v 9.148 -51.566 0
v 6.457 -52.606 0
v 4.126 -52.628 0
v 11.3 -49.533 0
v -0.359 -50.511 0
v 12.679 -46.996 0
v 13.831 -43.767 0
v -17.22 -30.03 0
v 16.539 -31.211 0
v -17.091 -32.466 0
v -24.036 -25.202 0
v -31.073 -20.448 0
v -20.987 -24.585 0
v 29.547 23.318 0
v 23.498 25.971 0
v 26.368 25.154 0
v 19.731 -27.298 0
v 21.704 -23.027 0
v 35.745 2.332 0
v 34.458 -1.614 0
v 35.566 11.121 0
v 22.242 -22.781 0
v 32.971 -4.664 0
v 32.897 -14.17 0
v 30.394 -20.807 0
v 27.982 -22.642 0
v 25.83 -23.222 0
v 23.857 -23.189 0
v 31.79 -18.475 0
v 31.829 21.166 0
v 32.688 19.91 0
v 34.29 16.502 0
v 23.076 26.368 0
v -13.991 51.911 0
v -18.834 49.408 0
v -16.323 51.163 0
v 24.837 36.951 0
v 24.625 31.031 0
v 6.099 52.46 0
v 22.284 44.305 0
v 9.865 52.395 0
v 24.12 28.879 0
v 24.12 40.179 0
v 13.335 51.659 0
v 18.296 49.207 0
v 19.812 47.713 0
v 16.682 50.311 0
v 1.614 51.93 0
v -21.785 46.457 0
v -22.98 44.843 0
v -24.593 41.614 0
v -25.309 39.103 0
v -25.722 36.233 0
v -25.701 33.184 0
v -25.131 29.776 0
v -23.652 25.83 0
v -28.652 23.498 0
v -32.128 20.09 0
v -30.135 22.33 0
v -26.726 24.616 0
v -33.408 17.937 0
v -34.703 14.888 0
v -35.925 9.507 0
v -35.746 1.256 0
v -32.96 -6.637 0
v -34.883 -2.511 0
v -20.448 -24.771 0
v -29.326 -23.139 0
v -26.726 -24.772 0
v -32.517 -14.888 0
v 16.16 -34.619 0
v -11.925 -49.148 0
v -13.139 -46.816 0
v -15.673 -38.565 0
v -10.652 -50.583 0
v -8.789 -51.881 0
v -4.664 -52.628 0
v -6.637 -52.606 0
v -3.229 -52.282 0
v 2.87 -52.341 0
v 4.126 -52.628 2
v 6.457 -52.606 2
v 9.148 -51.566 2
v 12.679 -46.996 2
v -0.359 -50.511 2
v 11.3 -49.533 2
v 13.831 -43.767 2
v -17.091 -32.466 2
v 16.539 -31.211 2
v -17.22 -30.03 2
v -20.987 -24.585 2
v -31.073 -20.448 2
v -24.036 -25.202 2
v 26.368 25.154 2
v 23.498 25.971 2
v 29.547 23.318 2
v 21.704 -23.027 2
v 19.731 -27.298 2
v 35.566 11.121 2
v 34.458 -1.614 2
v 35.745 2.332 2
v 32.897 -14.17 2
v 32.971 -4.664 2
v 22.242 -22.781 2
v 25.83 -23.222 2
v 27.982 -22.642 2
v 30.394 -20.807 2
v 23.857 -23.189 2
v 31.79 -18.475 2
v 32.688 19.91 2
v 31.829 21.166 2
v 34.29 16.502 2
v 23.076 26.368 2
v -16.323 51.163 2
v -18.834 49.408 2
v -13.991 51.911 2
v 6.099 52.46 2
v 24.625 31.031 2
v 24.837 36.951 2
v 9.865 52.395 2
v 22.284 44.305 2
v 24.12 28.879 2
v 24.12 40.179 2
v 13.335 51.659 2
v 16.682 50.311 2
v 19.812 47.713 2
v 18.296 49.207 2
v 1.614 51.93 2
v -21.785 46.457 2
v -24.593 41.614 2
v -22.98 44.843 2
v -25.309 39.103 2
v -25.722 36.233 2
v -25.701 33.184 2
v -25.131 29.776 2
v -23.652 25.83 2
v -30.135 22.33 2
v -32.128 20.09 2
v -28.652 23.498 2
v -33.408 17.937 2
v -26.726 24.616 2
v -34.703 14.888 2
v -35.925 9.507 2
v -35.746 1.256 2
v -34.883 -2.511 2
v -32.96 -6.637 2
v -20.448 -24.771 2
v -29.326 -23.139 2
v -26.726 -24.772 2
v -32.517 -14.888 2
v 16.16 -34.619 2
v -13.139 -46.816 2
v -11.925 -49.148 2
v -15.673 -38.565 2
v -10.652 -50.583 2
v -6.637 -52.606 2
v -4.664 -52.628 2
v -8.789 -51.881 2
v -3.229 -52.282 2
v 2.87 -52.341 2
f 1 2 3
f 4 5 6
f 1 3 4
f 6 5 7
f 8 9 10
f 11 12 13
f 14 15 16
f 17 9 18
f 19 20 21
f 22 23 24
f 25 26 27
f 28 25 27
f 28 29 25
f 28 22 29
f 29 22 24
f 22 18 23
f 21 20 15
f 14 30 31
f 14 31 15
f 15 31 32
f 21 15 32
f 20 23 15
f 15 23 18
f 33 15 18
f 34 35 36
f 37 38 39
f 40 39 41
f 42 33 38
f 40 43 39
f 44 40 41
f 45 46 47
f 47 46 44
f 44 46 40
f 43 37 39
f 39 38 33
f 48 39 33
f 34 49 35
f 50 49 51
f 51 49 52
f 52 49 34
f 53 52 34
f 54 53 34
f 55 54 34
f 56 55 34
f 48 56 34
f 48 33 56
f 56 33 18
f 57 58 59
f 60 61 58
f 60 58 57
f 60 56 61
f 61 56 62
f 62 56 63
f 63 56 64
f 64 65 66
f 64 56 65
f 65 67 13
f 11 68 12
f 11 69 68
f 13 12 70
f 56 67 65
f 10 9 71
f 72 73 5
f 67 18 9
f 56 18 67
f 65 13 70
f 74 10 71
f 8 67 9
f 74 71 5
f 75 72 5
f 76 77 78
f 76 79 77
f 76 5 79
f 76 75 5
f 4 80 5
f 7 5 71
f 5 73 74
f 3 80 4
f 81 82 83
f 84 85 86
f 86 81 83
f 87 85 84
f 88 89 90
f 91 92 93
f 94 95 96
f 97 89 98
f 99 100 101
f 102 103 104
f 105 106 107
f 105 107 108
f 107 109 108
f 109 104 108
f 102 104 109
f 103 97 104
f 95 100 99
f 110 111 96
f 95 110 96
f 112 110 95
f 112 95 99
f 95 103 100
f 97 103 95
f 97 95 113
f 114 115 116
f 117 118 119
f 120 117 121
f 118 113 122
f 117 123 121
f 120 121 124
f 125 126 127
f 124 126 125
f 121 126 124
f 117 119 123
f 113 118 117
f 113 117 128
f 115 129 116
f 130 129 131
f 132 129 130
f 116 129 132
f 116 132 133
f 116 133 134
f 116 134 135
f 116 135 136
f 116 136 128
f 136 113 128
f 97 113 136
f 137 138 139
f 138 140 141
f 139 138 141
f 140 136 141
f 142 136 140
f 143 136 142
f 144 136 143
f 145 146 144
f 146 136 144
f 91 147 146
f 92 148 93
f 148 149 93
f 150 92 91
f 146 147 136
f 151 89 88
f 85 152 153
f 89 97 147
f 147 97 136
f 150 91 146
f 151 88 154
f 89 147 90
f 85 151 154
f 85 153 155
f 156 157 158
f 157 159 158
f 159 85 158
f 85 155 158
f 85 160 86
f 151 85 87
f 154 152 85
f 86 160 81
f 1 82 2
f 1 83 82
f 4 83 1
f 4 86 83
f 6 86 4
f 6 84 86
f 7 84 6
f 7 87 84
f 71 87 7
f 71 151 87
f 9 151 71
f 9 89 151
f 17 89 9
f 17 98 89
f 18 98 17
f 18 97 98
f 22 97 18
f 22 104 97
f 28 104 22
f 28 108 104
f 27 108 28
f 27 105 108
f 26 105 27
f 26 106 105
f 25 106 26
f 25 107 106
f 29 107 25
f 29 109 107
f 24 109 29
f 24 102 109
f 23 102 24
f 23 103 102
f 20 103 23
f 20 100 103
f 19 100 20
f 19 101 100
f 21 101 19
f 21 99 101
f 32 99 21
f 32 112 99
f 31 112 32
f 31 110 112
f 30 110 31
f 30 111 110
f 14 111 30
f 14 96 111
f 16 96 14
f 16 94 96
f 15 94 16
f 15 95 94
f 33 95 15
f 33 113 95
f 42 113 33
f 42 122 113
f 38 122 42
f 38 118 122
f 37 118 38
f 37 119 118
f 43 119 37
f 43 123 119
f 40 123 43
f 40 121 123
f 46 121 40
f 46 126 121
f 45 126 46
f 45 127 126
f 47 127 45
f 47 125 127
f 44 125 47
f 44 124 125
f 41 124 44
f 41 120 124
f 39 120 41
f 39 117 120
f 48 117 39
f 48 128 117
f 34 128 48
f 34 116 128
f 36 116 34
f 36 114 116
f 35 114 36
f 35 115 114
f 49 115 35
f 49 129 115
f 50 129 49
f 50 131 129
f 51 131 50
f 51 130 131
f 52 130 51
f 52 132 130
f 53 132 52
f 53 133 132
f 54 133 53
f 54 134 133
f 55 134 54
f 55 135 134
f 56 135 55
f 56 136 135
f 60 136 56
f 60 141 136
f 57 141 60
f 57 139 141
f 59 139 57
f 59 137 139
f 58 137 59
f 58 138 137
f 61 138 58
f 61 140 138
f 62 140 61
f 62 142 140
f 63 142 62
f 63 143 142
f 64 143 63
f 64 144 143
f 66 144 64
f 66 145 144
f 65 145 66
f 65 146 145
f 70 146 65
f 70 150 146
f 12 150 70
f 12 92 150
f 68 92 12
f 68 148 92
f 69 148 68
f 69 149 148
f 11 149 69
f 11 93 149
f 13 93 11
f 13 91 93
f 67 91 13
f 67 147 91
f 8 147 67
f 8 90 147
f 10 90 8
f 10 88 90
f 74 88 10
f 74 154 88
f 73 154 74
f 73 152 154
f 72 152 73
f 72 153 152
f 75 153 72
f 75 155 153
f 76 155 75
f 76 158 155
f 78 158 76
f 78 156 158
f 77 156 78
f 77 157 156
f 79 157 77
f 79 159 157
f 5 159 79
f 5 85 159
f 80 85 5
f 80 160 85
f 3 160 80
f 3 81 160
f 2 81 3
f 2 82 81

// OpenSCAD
// ── Footprint 3-D model  ──────────────────────────────
// Physical size : 80.0 mm W  x  113.4 mm H
// Emboss depth  : 8.0 mm     Base: 2.0 mm
// Grid          : 112 x 158 px  (0.714 x 0.717 mm/px)
//
// Only one external file needed (same folder):
//   paw_heights.dat
//
// Render:  openscad -o model.stl paw.scad
// ─────────────────────────────────────────────────────────────

// Paw silhouette polygon (centered at origin, mm units)
module paw_outline() {
  polygon(points=[[9.865, 52.395], [6.099, 52.460], [1.614, 51.930], [-13.991, 51.911], [-16.323, 51.163], [-18.834, 49.408], [-21.785, 46.457], [-22.980, 44.843], [-24.593, 41.614], [-25.309, 39.103], [-25.722, 36.233], [-25.701, 33.184], [-25.131, 29.776], [-23.652, 25.830], [-26.726, 24.616], [-28.652, 23.498], [-30.135, 22.330], [-32.128, 20.090], [-33.408, 17.937], [-34.703, 14.888], [-35.925, 9.507], [-35.746, 1.256], [-34.883, -2.511], [-32.960, -6.637], [-32.517, -14.888], [-31.073, -20.448], [-29.326, -23.139], [-26.726, -24.772], [-24.036, -25.202], [-20.987, -24.585], [-20.448, -24.771], [-17.220, -30.030], [-17.091, -32.466], [-15.673, -38.565], [-13.139, -46.816], [-11.925, -49.148], [-10.652, -50.583], [-8.789, -51.881], [-6.637, -52.606], [-4.664, -52.628], [-3.229, -52.282], [-0.359, -50.511], [2.870, -52.341], [4.126, -52.628], [6.457, -52.606], [9.148, -51.566], [11.300, -49.533], [12.679, -46.996], [13.831, -43.767], [16.160, -34.619], [16.539, -31.211], [19.731, -27.298], [21.704, -23.027], [22.242, -22.781], [23.857, -23.189], [25.830, -23.222], [27.982, -22.642], [30.394, -20.807], [31.790, -18.475], [32.897, -14.170], [32.971, -4.664], [34.458, -1.614], [35.745, 2.332], [35.566, 11.121], [34.290, 16.502], [32.688, 19.910], [31.829, 21.166], [29.547, 23.318], [26.368, 25.154], [23.498, 25.971], [23.076, 26.368], [24.120, 28.879], [24.625, 31.031], [24.837, 36.951], [24.120, 40.179], [22.284, 44.305], [19.812, 47.713], [18.296, 49.207], [16.682, 50.311], [13.335, 51.659], [9.865, 52.395]]);
}

union() {

  // ── Embossed surface, clipped to paw silhouette ──────────
  intersection() {
    scale([0.714286, 0.717489, 1])
      surface(file = "paw_heights.dat", center = true, convexity = 10);
    linear_extrude(height = 11.000, center = false)
      paw_outline();
  }

  // ── Solid paw-shaped base plate (2.0 mm) ─
  linear_extrude(height = 2.000, center = false)
    paw_outline();

}
